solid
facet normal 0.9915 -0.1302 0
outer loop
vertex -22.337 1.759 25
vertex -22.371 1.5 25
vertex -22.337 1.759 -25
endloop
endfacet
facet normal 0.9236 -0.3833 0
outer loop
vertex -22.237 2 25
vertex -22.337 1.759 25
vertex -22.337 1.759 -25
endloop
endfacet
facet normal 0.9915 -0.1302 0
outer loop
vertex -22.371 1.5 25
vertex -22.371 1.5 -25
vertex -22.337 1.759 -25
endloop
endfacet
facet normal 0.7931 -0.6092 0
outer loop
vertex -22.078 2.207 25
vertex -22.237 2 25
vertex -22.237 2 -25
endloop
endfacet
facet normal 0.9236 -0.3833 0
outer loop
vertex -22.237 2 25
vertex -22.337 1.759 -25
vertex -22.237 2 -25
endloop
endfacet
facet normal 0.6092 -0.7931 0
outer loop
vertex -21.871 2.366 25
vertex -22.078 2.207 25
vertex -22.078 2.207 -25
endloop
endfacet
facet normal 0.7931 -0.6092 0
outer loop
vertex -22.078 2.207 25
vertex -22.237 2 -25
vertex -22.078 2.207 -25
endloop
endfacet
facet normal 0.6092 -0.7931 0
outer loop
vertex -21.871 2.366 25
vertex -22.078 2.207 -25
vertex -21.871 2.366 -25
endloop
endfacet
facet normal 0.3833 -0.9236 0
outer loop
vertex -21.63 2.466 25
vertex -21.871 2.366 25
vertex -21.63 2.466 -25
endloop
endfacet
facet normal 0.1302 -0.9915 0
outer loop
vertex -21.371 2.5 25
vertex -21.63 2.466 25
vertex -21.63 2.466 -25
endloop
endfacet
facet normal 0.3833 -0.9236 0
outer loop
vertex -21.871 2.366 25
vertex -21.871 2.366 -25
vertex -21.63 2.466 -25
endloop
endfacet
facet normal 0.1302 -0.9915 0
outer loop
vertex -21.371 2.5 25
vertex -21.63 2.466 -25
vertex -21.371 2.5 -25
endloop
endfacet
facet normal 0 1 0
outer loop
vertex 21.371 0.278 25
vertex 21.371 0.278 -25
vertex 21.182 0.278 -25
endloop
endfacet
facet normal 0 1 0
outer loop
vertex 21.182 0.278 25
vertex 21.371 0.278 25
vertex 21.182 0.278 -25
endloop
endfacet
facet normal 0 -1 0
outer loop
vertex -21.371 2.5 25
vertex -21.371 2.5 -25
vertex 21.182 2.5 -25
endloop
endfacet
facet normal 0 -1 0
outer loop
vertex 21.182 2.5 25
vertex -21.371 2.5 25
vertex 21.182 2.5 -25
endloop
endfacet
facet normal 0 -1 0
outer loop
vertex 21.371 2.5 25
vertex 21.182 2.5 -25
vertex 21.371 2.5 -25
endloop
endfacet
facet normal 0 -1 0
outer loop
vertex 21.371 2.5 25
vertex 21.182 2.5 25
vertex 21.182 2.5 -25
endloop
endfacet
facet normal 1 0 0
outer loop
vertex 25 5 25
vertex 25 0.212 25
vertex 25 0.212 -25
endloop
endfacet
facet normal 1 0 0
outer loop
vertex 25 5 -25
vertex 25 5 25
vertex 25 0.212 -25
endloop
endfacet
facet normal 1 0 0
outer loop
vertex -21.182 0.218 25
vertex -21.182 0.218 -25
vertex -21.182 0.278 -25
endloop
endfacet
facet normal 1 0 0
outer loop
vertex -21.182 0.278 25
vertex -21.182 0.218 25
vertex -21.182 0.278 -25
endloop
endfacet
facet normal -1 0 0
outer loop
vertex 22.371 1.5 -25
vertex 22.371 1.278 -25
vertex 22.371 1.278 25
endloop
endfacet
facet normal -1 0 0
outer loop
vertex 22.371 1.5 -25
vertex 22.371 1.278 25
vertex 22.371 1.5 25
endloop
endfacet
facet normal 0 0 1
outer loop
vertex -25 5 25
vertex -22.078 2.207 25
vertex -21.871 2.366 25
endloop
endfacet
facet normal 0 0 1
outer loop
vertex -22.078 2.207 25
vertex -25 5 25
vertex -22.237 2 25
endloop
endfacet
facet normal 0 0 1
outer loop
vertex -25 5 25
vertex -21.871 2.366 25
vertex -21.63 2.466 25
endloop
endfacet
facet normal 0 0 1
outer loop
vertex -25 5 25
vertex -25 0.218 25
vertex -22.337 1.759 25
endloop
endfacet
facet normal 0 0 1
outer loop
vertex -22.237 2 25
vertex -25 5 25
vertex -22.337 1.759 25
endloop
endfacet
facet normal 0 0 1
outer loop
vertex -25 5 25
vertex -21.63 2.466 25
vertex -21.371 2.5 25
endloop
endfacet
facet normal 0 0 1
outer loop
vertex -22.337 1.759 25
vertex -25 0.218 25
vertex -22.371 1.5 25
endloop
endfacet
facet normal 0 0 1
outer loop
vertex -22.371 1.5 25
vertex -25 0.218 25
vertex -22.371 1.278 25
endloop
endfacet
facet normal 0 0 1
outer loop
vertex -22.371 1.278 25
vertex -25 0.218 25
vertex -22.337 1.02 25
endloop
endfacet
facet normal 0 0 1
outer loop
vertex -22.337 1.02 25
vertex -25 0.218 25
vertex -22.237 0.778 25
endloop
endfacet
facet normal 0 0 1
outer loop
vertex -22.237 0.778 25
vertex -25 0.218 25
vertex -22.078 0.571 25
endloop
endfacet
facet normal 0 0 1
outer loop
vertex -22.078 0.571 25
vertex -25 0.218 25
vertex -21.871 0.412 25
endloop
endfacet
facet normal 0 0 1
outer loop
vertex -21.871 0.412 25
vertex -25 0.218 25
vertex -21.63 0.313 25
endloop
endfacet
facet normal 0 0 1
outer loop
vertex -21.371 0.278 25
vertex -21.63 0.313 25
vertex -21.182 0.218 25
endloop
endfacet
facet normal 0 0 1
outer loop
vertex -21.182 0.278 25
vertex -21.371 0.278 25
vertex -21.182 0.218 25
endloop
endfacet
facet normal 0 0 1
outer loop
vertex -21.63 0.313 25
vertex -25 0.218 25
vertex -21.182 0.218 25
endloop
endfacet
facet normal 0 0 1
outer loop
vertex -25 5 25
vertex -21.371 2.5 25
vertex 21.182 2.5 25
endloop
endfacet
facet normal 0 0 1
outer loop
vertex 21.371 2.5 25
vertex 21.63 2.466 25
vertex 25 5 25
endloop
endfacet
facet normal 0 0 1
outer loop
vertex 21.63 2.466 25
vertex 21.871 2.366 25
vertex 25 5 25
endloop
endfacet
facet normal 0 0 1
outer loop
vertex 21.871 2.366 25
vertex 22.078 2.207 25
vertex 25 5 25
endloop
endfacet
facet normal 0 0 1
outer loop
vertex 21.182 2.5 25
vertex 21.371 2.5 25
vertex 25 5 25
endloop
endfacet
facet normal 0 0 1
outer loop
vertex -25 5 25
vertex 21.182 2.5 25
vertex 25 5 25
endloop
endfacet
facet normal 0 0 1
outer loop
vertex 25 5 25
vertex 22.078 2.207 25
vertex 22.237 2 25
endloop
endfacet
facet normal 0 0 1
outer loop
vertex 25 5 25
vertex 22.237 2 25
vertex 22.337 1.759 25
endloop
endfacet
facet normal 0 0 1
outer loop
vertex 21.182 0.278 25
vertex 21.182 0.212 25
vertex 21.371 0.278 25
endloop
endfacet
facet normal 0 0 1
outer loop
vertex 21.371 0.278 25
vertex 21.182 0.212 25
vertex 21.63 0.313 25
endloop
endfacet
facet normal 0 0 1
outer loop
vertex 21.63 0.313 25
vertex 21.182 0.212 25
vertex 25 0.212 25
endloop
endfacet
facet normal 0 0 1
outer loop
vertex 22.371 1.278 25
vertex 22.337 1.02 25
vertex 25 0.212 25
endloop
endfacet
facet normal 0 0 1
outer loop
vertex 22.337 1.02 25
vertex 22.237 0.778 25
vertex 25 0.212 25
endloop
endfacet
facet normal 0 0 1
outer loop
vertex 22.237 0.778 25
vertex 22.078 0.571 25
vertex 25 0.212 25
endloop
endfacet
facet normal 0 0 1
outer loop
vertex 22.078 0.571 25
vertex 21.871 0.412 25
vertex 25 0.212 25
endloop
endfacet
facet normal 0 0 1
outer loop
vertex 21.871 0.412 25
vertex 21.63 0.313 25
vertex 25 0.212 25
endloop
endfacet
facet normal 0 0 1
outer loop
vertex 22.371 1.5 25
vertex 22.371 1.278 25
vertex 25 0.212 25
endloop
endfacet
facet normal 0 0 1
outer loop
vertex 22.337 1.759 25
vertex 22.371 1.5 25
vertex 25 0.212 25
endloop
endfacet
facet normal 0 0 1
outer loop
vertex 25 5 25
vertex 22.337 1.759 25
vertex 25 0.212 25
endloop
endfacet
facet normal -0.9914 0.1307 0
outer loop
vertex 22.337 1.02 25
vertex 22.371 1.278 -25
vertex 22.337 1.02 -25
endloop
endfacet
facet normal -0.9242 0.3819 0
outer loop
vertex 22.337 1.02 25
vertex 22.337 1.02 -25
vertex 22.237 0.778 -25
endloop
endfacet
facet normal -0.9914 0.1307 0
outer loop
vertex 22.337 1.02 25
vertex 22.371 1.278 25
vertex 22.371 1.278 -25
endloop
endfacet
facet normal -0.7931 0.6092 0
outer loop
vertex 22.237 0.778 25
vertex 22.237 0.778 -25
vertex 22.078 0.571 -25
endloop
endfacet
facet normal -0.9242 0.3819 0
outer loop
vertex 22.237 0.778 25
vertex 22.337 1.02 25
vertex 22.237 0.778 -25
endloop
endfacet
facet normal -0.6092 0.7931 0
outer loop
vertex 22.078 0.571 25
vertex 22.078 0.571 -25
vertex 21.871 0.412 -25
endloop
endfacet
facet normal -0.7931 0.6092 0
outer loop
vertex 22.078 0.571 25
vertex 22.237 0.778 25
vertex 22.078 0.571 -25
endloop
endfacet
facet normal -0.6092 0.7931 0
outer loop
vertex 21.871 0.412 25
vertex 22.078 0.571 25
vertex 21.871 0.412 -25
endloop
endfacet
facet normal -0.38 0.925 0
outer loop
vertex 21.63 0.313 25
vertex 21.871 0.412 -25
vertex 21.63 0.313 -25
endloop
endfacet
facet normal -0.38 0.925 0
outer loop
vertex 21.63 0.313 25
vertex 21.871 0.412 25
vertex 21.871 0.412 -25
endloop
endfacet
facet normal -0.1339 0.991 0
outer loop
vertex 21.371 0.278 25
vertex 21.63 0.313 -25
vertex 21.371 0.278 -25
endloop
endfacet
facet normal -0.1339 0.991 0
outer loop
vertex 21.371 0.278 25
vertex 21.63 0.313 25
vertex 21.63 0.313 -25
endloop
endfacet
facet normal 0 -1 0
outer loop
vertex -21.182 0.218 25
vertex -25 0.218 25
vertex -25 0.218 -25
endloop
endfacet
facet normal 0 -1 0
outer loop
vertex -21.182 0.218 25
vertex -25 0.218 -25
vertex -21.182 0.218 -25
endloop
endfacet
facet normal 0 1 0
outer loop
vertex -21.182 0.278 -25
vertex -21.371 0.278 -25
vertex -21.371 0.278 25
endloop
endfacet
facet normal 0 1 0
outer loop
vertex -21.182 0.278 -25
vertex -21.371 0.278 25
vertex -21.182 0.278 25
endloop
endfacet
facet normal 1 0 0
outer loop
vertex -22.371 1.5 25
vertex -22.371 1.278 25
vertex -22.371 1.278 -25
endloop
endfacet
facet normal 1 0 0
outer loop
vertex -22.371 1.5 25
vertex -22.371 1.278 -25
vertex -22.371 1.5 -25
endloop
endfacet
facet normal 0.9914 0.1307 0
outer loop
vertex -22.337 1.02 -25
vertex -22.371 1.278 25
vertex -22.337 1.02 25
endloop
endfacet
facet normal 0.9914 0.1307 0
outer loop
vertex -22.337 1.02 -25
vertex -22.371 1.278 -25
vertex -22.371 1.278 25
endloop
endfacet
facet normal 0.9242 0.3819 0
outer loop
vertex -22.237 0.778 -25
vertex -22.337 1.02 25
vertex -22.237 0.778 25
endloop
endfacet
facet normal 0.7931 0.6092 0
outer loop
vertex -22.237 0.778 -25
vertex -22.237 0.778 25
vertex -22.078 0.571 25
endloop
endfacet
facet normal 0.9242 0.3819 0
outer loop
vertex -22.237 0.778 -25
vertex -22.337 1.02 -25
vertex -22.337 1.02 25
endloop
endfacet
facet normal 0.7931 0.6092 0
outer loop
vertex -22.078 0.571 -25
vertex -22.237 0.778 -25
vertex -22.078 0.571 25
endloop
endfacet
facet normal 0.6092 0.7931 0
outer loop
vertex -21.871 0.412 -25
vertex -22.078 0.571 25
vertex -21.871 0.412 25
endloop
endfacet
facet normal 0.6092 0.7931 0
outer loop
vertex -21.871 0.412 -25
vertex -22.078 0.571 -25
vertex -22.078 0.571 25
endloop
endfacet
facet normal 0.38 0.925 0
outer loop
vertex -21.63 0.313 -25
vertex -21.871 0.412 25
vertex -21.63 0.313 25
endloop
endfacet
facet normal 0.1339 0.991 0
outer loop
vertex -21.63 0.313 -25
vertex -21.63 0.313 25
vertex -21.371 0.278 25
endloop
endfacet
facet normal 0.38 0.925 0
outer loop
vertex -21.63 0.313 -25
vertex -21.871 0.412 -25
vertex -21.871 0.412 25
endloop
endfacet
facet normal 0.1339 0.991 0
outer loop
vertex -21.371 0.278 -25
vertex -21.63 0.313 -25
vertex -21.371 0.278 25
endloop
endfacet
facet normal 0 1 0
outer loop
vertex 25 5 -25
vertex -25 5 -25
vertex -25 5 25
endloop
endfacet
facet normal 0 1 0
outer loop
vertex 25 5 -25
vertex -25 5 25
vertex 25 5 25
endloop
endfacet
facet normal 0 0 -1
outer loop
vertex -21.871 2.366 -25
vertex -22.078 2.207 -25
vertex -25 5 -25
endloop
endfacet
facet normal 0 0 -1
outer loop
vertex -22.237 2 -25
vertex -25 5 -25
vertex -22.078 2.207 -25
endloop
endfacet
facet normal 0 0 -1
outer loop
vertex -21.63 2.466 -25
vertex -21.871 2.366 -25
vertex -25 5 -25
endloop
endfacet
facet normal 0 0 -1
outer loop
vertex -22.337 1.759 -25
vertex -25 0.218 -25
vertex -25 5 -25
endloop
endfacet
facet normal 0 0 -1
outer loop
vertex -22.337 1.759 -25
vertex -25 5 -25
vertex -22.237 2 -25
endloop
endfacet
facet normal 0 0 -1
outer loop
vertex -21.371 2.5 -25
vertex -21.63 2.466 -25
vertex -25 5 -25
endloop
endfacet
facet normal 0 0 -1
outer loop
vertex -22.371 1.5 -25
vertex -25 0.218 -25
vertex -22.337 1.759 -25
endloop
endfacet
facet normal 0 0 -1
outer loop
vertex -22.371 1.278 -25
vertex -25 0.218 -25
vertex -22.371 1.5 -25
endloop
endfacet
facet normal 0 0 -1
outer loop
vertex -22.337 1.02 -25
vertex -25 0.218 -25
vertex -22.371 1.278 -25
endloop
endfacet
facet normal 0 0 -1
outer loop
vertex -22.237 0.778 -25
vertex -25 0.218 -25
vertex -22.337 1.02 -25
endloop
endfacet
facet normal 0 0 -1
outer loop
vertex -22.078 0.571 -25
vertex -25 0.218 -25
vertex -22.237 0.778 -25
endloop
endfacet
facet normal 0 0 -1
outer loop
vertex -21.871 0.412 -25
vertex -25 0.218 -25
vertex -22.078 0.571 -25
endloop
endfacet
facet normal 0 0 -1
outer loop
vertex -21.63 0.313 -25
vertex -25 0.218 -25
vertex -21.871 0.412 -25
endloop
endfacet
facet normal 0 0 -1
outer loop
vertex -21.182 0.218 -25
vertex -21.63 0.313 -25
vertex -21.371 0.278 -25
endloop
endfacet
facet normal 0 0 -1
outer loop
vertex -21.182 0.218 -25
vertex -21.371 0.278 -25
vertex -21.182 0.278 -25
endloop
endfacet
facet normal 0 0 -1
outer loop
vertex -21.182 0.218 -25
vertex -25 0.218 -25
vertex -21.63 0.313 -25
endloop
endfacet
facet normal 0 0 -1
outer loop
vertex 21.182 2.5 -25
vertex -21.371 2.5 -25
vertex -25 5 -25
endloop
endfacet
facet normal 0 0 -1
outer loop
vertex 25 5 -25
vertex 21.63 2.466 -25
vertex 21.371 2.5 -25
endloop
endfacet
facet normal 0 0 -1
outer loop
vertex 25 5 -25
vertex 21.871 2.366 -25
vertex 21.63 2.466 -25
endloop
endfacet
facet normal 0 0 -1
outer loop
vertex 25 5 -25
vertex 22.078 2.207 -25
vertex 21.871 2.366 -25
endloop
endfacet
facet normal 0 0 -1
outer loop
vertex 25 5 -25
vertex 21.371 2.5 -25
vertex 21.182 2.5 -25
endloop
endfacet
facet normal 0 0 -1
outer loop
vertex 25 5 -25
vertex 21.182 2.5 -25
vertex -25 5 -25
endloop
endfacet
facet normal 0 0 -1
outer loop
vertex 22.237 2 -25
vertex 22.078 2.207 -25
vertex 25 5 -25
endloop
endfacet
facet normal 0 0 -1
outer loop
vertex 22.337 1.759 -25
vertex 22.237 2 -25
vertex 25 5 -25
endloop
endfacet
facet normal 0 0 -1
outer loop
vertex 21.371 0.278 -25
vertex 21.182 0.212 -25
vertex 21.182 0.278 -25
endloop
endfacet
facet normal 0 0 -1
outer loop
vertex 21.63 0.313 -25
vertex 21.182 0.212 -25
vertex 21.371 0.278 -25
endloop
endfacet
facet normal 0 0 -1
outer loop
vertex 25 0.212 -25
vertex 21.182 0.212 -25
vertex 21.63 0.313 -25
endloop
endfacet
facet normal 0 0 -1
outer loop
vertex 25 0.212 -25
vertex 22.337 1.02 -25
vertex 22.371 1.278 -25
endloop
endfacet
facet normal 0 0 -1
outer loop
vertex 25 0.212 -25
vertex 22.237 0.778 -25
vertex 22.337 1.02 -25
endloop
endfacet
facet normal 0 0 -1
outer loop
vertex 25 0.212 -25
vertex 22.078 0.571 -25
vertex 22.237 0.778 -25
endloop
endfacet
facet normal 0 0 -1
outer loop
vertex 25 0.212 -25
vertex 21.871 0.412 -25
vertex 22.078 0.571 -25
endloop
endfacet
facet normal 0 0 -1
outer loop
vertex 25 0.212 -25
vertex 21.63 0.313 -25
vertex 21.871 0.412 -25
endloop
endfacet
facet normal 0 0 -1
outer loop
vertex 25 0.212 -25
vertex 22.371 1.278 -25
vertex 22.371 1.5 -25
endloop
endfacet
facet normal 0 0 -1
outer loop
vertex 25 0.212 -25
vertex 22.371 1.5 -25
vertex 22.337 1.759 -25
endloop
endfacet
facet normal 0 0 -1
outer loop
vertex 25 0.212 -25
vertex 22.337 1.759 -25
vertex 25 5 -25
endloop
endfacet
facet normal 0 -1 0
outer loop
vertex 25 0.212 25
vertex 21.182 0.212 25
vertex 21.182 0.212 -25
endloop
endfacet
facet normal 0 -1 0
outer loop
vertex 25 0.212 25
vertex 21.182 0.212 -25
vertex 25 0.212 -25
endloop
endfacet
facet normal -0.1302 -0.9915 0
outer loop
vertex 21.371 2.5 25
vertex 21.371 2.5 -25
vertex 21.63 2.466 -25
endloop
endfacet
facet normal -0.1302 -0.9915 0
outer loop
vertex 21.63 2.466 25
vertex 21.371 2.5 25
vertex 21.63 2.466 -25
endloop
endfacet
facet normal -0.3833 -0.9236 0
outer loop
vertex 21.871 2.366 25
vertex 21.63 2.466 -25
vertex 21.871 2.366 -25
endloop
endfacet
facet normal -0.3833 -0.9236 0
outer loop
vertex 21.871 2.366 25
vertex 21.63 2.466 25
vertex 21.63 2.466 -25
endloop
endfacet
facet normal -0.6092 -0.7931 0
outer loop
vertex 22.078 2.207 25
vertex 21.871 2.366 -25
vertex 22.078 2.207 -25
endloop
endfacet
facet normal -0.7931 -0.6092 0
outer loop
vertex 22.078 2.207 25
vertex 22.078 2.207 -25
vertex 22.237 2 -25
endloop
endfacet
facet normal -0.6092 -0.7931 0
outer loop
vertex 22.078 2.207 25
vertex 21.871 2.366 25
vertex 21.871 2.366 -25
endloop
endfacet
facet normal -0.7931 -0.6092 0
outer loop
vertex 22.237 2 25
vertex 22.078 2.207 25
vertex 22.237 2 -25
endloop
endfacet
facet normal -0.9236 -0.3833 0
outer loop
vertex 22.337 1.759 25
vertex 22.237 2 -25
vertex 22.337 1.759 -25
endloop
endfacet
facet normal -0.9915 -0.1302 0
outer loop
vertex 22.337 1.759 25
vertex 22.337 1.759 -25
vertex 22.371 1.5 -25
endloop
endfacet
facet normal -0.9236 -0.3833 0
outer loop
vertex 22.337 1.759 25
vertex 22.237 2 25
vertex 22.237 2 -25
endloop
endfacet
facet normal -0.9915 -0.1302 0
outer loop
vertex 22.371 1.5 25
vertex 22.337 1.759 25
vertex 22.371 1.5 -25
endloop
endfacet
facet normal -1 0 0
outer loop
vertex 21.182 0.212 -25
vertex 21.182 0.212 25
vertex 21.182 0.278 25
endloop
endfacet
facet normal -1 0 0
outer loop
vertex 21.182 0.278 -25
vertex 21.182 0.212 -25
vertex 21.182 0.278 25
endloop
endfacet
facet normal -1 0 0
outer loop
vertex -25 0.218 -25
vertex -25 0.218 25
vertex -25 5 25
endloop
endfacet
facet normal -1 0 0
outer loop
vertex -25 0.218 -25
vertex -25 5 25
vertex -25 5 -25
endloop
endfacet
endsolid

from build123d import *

# Parameters (mm, degrees)
SKETCH2_W           = 50
SKETCH2_H           = 50
BOSS_EXTRUDE1_DEPTH = 5
SKETCH6_W           = 42.36475395
SKETCH6_H           = 2.5
CUT_EXTRUDE1_DEPTH  = 50
SKETCH9_W           = 1.188642814
SKETCH9_H           = 2.221510963
CUT_EXTRUDE3_DEPTH  = 50
FILLET2_R           = 1
FILLET3_R           = 1
SKETCH11_W          = 1.18864281
SKETCH11_H          = 2.22151096
CUT_EXTRUDE4_DEPTH  = 50
FILLET5_R           = 1
FILLET6_R           = 1
SKETCH14_W          = 3.817623025
SKETCH14_H          = 0.21818248
CUT_EXTRUDE5_DEPTH  = 50
SKETCH16_W          = 3.817623025
SKETCH16_H          = 0.211754728
CUT_EXTRUDE6_DEPTH  = 50


with BuildPart() as part:
    # Sketch2 → Boss-Extrude1 (new body)
    with BuildSketch(Plane(origin=(0, 0, 0), x_dir=(1, 0, 0), z_dir=(0, 1, 0))):
        Rectangle(SKETCH2_W, SKETCH2_H)
    extrude(amount=BOSS_EXTRUDE1_DEPTH)

    # Sketch6 → Cut-Extrude1 (cut)
    with BuildSketch(Plane(origin=(0, 0, -25), x_dir=(-1, 0, 0), z_dir=(0, 0, -1))):
        with Locations((0, 1.25)):
            Rectangle(SKETCH6_W, SKETCH6_H)
    extrude(amount=-CUT_EXTRUDE1_DEPTH, mode=Mode.SUBTRACT)

    # Sketch9 → Cut-Extrude3 (cut)
    with BuildSketch(Plane(origin=(0, 0, -25), x_dir=(-1, 0, 0), z_dir=(0, 0, -1))):
        with Locations((-21.776698382, 1.389244518)):
            Rectangle(SKETCH9_W, SKETCH9_H)
    extrude(amount=-CUT_EXTRUDE3_DEPTH, mode=Mode.SUBTRACT)

    # Fillet2
    fillet2_edges = [part.edges().sort_by_distance(p)[0] for p in [
        (22.371019789, 2.5, 0),
    ]]
    fillet(fillet2_edges, radius=FILLET2_R)

    # Fillet3
    fillet3_edges = [part.edges().sort_by_distance(p)[0] for p in [
        (22.371019789, 0.278489037, 0),
    ]]
    fillet(fillet3_edges, radius=FILLET3_R)

    # Sketch11 → Cut-Extrude4 (cut)
    with BuildSketch(Plane.XY.offset(25)):
        with Locations((-21.77669838, 1.38924452)):
            Rectangle(SKETCH11_W, SKETCH11_H)
    extrude(amount=-CUT_EXTRUDE4_DEPTH, mode=Mode.SUBTRACT)

    # Fillet5
    fillet5_edges = [part.edges().sort_by_distance(p)[0] for p in [
        (-22.371019785, 2.5, 0),
    ]]
    fillet(fillet5_edges, radius=FILLET5_R)

    # Fillet6
    fillet6_edges = [part.edges().sort_by_distance(p)[0] for p in [
        (-22.371019785, 0.27848904, 0),
    ]]
    fillet(fillet6_edges, radius=FILLET6_R)

    # Sketch14 → Cut-Extrude5 (cut)
    with BuildSketch(Plane.XY.offset(25)):
        with Locations((-23.091188487, 0.10909124)):
            Rectangle(SKETCH14_W, SKETCH14_H)
    extrude(amount=-CUT_EXTRUDE5_DEPTH, mode=Mode.SUBTRACT)

    # Sketch16 → Cut-Extrude6 (cut)
    with BuildSketch(Plane.XY.offset(25)):
        with Locations((23.091188487, 0.105877364)):
            Rectangle(SKETCH16_W, SKETCH16_H)
    extrude(amount=-CUT_EXTRUDE6_DEPTH, mode=Mode.SUBTRACT)


solid = part.part
